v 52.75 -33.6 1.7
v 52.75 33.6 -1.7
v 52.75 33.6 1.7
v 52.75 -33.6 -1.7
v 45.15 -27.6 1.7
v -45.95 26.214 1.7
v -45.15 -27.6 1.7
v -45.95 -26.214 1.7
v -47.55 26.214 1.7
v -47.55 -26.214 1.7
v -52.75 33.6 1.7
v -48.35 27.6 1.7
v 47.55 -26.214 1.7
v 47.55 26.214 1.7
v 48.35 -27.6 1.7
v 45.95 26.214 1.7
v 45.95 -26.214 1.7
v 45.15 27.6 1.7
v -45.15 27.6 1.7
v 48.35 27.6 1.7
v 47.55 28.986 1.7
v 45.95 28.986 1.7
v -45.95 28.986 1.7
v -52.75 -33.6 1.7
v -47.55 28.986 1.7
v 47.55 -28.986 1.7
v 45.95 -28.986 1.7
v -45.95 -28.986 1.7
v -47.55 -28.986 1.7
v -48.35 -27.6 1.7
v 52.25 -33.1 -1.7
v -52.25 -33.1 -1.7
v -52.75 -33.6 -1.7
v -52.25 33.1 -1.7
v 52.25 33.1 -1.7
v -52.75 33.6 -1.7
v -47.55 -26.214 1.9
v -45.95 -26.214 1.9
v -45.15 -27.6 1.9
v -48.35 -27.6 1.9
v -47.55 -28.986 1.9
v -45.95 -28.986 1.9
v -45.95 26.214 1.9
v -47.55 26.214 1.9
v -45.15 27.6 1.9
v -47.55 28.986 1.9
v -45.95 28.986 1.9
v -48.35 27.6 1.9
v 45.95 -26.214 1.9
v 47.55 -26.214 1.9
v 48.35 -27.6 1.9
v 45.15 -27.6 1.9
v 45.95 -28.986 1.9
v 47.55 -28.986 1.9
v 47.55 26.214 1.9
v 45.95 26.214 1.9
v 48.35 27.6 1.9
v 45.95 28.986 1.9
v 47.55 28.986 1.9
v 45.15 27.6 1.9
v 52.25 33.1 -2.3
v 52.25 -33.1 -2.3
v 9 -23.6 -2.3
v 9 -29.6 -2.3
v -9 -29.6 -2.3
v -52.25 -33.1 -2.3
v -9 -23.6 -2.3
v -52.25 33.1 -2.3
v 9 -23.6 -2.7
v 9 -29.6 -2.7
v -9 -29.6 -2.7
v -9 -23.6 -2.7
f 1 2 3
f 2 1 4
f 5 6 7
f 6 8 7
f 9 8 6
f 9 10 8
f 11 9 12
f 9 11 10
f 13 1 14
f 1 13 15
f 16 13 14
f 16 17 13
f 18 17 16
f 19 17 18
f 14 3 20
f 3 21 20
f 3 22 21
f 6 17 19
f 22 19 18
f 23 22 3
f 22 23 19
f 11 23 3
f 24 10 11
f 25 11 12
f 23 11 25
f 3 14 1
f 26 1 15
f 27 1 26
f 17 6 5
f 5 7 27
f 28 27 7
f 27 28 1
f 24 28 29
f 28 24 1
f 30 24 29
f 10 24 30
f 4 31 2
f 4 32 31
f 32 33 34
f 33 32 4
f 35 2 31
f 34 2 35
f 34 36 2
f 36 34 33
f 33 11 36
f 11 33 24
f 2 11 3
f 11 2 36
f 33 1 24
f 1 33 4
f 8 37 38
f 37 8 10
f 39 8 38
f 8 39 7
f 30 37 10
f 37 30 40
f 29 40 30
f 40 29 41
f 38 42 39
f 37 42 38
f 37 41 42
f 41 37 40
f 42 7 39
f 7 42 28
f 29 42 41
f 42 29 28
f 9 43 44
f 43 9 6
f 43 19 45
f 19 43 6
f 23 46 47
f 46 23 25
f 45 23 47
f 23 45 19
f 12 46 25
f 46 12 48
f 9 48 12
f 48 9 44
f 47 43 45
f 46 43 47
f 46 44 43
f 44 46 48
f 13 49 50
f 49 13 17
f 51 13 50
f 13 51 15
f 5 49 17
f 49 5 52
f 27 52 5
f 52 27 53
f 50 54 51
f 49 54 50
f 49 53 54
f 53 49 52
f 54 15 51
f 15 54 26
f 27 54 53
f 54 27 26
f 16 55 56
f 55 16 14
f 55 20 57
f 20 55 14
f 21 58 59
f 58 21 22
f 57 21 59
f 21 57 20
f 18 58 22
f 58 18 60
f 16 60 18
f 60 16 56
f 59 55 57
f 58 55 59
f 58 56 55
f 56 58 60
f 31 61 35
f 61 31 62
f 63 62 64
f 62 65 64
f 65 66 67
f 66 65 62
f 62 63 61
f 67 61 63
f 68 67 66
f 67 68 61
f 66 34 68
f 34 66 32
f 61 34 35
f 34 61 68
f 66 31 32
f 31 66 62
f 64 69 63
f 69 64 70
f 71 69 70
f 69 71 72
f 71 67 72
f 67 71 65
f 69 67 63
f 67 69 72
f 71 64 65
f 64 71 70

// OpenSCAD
// Parameters
overall_width_mm = 105.5; //[52.75:211:0.1]
overall_height_mm = 67.2; //[33.6:134.4:0.1]
overall_thickness_mm = 3.4; //[1.7:6.8:0.1]
eps_mm = 0.2; //[0.05:1:0.05]
overlap_mm = 1; //[0.5:2:0.1]
aperture_min_x_mm = -50; //[-100:0:0.1]
aperture_min_y_mm = -26.5; //[-67.2:0:0.1]
aperture_max_x_mm = 50; //[0:105.5:0.1]
aperture_max_y_mm = 31.5; //[0:67.2:0.1]
aperture_max_z_mm = 0.5; //[0.1:3.4:0.1]
touch_min_x_mm = -52.75; //[-105.5:0:0.1]
touch_min_y_mm = -31.5; //[-67.2:0:0.1]
touch_max_x_mm = 52.75; //[0:105.5:0.1]
touch_max_y_mm = 33.5; //[0:67.2:0.1]
touch_max_z_mm = 1; //[0:5:0.1]
pcb_enable = 1; //[0:1:1]
pcb_width_mm = 104.5; //[52.25:209:0.1]
pcb_height_mm = 66.2; //[33.1:132.4:0.1]
pcb_thickness_mm = 1.6; //[0:3.2:0.1]
pcb_offset_x_mm = 0; //[-10:10:0.1]
pcb_offset_y_mm = 0; //[-10:10:0.1]
pcb_offset_z_mm = 0; //[-5:5:0.1]
mounting_enable = 1; //[0:1:1]
mount_hole_diameter_mm = 3.2; //[1.6:6.4:0.1]
mount_edge_margin_x_mm = 6; //[3:12:0.1]
mount_edge_margin_y_mm = 6; //[3:12:0.1]
thread_depth_or_threads_mm = 0; //[0:6:0.1]
connector_width_mm = 18; //[9:36:0.1]
connector_height_mm = 6; //[3:12:0.1]
connector_thickness_mm = 2; //[1:6:0.1]
connector_offset_y_from_bottom_mm = 4; //[0:15:0.1]

// Display module with detailed geometry
module display() {
  color([0.85, 0.85, 0.8]) {
    // Main body
    difference() {
      cube([overall_width_mm, overall_height_mm, overall_thickness_mm], center=true);
      
      // Aperture cutout
      translate([(aperture_min_x_mm + aperture_max_x_mm)/2,
                 (aperture_min_y_mm + aperture_max_y_mm)/2,
                 overall_thickness_mm/2 - (aperture_max_z_mm + eps_mm)/2 + eps_mm/2])
        cube([aperture_max_x_mm - aperture_min_x_mm,
              aperture_max_y_mm - aperture_min_y_mm,
              aperture_max_z_mm + eps_mm], center=true);
    }
    
    // Touch screen volume
    translate([(touch_min_x_mm + touch_max_x_mm)/2,
               (touch_min_y_mm + touch_max_y_mm)/2,
               overall_thickness_mm/2 + touch_max_z_mm/2 - overlap_mm])
      cube([touch_max_x_mm - touch_min_x_mm,
            touch_max_y_mm - touch_min_y_mm,
            touch_max_z_mm], center=true);
    
    // PCB volume
    if (pcb_enable) {
      translate([pcb_offset_x_mm,
                 pcb_offset_y_mm,
                 -overall_thickness_mm/2 - pcb_thickness_mm/2 + overlap_mm + pcb_offset_z_mm])
        cube([pcb_width_mm, pcb_height_mm, pcb_thickness_mm], center=true);
    }
    
    // Connector or feature region
    translate([0,
               -overall_height_mm/2 + connector_offset_y_from_bottom_mm + connector_height_mm/2,
               -overall_thickness_mm/2 - connector_thickness_mm/2 + overlap_mm])
      cube([connector_width_mm, connector_height_mm, connector_thickness_mm], center=true);
    
    // Mounting holes
    if (mounting_enable) {
      for (x = [-1, 1], y = [-1, 1]) {
        translate([x * (overall_width_mm/2 - mount_edge_margin_x_mm),
                   y * (overall_height_mm/2 - mount_edge_margin_y_mm),
                   0])
          cylinder(r=mount_hole_diameter_mm/2,
                   h=overall_thickness_mm + thread_depth_or_threads_mm + 2*eps_mm,
                   center=true);
      }
    }
  }
}

// Assembly
module assembly() {
  display();
}

assembly();
